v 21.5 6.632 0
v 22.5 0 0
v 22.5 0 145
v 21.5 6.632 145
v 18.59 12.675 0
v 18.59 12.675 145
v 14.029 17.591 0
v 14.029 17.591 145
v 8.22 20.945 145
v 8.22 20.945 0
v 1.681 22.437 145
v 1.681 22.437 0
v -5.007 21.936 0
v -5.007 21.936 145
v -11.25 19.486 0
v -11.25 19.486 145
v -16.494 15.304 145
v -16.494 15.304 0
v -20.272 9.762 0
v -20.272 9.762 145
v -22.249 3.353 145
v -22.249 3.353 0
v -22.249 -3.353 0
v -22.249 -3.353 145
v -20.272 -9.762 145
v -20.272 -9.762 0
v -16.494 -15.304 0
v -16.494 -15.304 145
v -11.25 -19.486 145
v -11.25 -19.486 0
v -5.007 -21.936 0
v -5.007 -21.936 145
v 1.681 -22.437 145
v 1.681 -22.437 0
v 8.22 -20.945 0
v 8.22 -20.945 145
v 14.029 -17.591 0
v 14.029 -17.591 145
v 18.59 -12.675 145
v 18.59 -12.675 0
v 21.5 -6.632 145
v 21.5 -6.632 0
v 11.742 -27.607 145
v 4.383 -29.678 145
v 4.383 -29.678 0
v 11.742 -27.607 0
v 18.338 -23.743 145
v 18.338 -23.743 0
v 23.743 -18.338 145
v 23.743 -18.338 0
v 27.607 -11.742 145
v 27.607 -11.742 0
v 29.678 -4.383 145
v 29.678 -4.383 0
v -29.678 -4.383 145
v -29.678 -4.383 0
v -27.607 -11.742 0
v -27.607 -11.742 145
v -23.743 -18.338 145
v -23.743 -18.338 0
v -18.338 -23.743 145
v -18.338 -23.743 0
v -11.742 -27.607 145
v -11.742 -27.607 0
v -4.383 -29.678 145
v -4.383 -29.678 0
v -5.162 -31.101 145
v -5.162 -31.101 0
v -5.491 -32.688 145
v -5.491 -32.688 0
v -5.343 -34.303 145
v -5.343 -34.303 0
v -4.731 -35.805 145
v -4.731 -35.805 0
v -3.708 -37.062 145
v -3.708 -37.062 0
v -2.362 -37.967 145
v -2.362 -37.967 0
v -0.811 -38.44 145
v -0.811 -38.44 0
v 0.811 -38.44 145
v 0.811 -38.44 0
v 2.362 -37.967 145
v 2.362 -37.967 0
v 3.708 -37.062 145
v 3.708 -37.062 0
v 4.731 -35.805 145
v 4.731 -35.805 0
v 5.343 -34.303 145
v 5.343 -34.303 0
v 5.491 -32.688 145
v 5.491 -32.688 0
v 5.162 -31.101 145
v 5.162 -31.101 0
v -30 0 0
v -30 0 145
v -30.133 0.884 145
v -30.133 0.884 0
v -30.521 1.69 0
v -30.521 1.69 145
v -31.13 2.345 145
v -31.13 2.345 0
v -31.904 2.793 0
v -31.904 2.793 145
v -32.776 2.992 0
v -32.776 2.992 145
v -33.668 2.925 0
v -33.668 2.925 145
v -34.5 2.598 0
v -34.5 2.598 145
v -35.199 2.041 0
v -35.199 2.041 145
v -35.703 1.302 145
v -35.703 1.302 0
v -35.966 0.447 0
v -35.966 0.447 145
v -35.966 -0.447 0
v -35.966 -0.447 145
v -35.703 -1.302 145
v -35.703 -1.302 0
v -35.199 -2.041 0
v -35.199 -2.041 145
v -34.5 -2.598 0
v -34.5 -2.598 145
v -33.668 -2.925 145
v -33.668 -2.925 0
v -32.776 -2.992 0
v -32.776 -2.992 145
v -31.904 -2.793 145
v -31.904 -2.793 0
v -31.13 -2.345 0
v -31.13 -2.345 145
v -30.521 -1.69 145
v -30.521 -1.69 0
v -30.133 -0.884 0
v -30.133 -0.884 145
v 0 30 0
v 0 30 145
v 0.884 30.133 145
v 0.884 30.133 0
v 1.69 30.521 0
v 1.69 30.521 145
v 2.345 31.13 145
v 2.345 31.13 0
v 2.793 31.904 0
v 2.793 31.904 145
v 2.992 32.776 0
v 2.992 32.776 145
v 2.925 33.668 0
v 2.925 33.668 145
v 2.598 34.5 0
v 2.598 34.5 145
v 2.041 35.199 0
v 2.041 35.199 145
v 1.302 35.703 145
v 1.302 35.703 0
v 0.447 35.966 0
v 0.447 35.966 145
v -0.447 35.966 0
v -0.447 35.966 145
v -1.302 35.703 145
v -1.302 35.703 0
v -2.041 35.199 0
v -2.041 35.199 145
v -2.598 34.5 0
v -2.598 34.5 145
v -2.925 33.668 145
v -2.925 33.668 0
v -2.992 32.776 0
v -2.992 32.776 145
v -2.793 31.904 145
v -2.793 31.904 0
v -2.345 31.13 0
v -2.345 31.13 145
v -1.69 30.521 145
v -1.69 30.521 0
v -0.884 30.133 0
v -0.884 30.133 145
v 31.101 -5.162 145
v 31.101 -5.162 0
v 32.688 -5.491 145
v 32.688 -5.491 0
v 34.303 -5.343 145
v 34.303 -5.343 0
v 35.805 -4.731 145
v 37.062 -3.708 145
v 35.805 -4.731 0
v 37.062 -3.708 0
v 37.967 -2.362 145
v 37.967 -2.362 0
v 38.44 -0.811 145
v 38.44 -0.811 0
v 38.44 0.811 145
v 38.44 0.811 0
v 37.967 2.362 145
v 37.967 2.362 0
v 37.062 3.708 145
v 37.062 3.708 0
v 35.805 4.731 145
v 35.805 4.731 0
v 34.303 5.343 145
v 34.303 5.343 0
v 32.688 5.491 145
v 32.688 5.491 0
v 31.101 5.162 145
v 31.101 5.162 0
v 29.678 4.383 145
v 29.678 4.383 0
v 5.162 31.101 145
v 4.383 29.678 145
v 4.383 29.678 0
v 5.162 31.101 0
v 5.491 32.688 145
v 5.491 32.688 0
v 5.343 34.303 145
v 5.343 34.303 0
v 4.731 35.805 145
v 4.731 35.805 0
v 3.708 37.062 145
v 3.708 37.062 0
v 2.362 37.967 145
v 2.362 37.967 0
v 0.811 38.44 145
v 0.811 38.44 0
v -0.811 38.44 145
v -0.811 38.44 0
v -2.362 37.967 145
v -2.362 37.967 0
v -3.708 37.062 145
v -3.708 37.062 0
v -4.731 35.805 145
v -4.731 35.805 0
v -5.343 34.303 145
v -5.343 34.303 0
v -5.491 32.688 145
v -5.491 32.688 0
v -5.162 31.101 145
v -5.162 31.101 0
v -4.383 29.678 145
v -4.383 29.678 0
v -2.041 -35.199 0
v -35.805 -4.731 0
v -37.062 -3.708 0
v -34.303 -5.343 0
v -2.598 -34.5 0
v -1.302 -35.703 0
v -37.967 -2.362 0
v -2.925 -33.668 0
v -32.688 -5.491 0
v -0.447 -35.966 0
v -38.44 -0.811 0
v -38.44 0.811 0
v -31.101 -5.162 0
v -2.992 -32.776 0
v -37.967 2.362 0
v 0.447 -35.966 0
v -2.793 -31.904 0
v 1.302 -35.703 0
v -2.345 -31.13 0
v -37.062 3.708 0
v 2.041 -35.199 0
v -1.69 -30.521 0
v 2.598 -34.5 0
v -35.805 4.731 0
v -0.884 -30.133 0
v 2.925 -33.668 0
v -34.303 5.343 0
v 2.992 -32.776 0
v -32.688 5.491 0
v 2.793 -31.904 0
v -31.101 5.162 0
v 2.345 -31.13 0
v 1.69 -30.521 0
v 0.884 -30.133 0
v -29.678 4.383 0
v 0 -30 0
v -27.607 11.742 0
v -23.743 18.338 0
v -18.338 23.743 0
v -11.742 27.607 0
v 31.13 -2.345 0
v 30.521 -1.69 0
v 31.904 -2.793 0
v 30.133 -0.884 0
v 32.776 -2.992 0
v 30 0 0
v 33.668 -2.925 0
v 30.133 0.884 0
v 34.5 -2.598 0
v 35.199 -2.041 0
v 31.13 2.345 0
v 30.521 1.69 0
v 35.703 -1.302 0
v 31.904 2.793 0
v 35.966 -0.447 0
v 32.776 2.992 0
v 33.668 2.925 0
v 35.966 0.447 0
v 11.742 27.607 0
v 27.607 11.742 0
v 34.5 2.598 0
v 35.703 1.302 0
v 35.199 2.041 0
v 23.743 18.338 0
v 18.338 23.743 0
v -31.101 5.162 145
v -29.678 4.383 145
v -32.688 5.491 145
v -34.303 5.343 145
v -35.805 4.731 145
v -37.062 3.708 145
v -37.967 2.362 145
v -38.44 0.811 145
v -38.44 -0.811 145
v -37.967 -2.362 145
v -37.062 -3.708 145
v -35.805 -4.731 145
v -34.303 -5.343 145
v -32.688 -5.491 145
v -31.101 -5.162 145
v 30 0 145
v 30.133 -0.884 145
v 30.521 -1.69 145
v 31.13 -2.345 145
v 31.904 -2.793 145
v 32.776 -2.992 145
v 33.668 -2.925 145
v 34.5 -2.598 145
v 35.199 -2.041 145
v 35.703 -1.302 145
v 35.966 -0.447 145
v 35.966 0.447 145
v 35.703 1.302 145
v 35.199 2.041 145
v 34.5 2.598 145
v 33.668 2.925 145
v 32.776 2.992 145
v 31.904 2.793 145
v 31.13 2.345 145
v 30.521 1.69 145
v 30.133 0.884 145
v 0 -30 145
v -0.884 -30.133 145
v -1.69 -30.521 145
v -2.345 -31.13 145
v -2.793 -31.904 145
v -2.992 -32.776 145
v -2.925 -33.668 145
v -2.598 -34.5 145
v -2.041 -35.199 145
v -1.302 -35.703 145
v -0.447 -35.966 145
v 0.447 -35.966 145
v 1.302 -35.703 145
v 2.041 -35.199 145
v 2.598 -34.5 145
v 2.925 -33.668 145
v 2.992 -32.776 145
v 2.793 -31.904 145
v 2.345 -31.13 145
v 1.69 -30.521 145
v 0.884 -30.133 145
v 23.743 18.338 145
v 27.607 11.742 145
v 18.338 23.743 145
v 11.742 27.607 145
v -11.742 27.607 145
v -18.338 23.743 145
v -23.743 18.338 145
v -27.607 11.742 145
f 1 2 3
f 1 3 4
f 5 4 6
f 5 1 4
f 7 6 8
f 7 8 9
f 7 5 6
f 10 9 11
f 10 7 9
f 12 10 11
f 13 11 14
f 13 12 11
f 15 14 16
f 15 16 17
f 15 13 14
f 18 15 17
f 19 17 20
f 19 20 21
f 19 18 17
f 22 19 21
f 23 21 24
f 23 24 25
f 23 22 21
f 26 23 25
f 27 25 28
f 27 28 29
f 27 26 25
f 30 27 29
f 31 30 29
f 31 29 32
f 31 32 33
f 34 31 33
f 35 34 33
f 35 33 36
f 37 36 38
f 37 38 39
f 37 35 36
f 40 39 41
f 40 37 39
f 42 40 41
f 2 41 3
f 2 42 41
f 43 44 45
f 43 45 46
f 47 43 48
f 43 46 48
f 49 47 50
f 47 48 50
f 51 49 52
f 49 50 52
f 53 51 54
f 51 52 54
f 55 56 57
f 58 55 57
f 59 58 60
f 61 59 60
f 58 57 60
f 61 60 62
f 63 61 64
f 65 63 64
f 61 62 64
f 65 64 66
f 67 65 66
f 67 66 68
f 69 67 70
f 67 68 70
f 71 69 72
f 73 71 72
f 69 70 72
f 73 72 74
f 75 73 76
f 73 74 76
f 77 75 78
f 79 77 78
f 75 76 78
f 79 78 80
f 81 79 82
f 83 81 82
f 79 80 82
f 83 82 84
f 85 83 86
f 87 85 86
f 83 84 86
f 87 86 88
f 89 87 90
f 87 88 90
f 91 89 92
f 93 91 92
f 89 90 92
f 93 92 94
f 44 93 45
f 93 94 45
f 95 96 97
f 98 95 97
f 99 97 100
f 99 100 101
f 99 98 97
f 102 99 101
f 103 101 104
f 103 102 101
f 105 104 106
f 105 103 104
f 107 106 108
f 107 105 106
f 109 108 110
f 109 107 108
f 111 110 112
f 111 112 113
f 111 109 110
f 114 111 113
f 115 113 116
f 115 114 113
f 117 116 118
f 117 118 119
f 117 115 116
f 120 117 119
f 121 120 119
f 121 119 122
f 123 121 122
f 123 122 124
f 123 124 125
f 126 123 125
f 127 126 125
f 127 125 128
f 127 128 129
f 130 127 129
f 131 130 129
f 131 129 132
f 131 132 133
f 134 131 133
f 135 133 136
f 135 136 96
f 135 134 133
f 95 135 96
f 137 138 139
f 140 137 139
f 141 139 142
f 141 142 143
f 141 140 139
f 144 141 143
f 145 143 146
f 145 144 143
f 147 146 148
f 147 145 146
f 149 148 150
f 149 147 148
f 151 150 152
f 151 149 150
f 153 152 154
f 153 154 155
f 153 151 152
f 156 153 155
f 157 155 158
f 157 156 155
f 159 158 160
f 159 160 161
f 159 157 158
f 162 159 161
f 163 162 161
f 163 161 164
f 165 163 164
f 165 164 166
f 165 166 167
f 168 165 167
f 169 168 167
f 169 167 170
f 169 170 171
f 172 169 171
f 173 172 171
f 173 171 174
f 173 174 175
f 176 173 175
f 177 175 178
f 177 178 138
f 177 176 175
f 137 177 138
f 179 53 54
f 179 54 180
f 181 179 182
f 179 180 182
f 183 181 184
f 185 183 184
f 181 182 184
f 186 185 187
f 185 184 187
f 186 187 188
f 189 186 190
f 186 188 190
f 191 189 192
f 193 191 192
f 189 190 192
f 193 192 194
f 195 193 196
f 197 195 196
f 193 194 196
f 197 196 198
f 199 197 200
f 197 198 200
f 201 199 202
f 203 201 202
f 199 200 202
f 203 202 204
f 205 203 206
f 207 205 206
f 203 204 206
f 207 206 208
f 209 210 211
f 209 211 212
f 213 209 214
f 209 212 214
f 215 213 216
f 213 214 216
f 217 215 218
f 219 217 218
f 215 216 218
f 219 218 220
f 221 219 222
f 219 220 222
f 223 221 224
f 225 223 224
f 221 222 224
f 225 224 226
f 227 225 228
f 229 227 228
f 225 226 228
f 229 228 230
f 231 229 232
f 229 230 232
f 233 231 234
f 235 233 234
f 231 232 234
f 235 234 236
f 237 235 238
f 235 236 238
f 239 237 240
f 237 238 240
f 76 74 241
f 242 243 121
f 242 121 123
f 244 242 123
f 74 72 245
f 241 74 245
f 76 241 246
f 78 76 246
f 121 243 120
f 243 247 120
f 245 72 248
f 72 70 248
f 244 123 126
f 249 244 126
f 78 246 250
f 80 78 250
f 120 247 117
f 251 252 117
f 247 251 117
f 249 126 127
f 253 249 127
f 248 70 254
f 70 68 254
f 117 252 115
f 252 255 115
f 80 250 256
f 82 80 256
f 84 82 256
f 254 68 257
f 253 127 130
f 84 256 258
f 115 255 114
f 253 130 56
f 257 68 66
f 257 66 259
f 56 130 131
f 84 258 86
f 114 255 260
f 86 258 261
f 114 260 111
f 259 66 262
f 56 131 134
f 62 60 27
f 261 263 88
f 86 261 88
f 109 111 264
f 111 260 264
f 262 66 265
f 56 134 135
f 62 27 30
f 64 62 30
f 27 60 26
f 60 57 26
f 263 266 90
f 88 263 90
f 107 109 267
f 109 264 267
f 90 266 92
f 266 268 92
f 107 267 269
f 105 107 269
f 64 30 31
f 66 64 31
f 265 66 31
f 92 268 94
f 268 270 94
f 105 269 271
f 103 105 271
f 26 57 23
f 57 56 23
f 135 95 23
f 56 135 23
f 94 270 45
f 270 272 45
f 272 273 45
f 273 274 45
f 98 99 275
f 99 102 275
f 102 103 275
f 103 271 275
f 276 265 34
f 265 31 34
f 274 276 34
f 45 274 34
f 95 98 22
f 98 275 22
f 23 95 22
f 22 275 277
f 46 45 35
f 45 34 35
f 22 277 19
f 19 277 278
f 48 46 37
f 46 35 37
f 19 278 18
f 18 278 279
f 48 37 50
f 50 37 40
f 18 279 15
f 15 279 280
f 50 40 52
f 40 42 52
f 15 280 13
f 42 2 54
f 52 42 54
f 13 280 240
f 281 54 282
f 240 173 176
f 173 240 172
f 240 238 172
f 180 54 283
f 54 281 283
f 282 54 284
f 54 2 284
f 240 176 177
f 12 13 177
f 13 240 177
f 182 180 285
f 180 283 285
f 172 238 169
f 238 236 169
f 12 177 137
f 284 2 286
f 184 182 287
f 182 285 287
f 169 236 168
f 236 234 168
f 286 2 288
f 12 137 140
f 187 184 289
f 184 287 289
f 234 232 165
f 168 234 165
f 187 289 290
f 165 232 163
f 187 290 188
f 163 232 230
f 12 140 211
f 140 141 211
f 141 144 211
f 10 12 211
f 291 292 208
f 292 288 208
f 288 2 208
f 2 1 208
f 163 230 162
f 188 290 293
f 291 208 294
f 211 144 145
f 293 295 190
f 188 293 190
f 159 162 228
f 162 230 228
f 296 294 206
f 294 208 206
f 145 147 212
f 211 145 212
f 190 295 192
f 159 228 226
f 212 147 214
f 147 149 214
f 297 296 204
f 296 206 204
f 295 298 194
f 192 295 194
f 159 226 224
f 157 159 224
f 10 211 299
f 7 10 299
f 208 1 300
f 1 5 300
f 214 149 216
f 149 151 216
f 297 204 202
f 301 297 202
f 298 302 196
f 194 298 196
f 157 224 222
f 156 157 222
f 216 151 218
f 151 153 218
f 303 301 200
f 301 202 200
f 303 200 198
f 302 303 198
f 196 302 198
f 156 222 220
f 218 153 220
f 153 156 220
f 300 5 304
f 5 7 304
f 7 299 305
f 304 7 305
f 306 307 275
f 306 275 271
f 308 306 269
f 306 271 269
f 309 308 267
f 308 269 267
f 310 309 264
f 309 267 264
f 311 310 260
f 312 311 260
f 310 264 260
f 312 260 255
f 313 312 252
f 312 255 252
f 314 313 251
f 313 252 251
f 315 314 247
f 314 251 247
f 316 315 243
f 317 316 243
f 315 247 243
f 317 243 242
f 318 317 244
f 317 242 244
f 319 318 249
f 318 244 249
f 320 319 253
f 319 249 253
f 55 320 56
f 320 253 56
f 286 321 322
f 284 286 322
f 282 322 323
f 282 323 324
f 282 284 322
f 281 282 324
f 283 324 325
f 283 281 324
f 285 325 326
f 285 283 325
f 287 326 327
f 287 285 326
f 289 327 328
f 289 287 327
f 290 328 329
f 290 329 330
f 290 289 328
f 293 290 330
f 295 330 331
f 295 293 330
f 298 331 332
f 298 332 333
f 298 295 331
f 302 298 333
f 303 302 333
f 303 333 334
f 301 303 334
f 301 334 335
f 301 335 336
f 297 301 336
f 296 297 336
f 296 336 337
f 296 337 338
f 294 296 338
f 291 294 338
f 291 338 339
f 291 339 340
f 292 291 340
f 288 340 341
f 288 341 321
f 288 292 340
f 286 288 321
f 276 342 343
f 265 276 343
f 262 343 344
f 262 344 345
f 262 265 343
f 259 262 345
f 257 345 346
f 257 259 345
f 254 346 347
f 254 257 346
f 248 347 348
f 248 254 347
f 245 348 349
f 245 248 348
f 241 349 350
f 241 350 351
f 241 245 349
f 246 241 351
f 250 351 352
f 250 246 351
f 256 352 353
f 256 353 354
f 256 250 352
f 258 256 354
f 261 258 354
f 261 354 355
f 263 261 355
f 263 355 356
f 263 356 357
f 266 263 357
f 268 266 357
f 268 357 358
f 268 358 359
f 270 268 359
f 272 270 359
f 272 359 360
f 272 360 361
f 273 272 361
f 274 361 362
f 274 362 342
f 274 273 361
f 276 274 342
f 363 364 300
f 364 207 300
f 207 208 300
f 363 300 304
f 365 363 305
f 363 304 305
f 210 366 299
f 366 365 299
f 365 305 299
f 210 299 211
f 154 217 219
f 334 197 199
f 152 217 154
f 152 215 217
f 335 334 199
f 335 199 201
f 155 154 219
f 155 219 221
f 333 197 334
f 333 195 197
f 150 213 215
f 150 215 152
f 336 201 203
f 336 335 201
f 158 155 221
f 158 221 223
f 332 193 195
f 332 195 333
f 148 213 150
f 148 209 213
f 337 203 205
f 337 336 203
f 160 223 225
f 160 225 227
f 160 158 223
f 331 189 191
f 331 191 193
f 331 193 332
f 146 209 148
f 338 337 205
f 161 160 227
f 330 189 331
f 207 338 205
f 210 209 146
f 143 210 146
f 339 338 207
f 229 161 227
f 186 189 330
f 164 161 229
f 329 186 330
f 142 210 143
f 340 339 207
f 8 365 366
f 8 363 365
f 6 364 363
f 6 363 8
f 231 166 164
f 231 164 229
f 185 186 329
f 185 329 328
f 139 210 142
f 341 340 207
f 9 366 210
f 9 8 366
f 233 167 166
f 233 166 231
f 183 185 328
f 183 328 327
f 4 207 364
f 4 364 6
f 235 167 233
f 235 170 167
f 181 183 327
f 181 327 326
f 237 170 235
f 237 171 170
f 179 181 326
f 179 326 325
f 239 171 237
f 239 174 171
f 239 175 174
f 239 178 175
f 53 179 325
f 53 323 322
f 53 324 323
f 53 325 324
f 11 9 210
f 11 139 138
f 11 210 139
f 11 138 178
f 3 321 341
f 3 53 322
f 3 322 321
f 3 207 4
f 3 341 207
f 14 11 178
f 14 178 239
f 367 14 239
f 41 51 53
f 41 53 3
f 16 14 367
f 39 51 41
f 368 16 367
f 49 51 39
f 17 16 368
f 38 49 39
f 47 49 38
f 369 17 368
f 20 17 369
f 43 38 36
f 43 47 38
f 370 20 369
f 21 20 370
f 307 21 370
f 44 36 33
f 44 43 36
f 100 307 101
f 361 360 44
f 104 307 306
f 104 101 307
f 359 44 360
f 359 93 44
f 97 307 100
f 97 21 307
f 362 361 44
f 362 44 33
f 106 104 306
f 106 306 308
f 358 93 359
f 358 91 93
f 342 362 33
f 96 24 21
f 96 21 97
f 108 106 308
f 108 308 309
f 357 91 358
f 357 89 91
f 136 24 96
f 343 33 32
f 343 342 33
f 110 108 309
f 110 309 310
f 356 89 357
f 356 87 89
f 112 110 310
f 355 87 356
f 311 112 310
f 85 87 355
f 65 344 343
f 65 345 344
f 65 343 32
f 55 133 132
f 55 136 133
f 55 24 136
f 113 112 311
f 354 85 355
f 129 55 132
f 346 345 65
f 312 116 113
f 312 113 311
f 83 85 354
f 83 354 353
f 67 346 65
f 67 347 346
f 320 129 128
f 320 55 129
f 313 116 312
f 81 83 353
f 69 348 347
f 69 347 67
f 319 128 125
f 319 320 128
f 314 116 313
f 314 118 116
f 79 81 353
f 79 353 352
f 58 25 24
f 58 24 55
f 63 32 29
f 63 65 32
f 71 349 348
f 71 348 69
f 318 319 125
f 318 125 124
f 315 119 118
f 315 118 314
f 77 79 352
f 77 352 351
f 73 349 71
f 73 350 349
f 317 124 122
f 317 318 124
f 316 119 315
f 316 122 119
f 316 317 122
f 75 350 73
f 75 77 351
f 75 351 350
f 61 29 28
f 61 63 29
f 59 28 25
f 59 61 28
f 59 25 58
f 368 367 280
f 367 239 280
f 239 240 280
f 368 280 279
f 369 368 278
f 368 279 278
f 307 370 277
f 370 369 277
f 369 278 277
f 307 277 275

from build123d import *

# Parameters (mm, degrees)
SKETCH1_R               = 30
SKETCH1_R_2             = 22.5
BOSS_EXTRUDE2_DEPTH     = 145
CROQUIS1_R              = 5.5
CROQUIS1_R_2            = 3
SALIENTE_EXTRUIR1_DEPTH = 145
MATRIZC1_COUNT          = 4


with BuildPart() as part:
    # Sketch1 → Boss-Extrude2 (new body)
    with BuildSketch(Plane.XY):
        Circle(SKETCH1_R)
        Circle(SKETCH1_R_2, mode=Mode.SUBTRACT)
    extrude(amount=BOSS_EXTRUDE2_DEPTH)

    # Croquis1 → Saliente-Extruir1 (add)
    with BuildSketch(Plane.XY):
        with Locations((-33, 0)):
            Circle(CROQUIS1_R)
        with Locations((-33, 0)):
            Circle(CROQUIS1_R_2, mode=Mode.SUBTRACT)
    saliente_extruir1 = extrude(amount=SALIENTE_EXTRUIR1_DEPTH)

    # MatrizC1: Saliente-Extruir1 ×4 about axis
    matrizc1_axis = Axis((0, 0, 0), (0, 0, 1))
    for i in range(1, MATRIZC1_COUNT):
        add(saliente_extruir1.rotate(matrizc1_axis, i * 360 / MATRIZC1_COUNT))


solid = part.part
